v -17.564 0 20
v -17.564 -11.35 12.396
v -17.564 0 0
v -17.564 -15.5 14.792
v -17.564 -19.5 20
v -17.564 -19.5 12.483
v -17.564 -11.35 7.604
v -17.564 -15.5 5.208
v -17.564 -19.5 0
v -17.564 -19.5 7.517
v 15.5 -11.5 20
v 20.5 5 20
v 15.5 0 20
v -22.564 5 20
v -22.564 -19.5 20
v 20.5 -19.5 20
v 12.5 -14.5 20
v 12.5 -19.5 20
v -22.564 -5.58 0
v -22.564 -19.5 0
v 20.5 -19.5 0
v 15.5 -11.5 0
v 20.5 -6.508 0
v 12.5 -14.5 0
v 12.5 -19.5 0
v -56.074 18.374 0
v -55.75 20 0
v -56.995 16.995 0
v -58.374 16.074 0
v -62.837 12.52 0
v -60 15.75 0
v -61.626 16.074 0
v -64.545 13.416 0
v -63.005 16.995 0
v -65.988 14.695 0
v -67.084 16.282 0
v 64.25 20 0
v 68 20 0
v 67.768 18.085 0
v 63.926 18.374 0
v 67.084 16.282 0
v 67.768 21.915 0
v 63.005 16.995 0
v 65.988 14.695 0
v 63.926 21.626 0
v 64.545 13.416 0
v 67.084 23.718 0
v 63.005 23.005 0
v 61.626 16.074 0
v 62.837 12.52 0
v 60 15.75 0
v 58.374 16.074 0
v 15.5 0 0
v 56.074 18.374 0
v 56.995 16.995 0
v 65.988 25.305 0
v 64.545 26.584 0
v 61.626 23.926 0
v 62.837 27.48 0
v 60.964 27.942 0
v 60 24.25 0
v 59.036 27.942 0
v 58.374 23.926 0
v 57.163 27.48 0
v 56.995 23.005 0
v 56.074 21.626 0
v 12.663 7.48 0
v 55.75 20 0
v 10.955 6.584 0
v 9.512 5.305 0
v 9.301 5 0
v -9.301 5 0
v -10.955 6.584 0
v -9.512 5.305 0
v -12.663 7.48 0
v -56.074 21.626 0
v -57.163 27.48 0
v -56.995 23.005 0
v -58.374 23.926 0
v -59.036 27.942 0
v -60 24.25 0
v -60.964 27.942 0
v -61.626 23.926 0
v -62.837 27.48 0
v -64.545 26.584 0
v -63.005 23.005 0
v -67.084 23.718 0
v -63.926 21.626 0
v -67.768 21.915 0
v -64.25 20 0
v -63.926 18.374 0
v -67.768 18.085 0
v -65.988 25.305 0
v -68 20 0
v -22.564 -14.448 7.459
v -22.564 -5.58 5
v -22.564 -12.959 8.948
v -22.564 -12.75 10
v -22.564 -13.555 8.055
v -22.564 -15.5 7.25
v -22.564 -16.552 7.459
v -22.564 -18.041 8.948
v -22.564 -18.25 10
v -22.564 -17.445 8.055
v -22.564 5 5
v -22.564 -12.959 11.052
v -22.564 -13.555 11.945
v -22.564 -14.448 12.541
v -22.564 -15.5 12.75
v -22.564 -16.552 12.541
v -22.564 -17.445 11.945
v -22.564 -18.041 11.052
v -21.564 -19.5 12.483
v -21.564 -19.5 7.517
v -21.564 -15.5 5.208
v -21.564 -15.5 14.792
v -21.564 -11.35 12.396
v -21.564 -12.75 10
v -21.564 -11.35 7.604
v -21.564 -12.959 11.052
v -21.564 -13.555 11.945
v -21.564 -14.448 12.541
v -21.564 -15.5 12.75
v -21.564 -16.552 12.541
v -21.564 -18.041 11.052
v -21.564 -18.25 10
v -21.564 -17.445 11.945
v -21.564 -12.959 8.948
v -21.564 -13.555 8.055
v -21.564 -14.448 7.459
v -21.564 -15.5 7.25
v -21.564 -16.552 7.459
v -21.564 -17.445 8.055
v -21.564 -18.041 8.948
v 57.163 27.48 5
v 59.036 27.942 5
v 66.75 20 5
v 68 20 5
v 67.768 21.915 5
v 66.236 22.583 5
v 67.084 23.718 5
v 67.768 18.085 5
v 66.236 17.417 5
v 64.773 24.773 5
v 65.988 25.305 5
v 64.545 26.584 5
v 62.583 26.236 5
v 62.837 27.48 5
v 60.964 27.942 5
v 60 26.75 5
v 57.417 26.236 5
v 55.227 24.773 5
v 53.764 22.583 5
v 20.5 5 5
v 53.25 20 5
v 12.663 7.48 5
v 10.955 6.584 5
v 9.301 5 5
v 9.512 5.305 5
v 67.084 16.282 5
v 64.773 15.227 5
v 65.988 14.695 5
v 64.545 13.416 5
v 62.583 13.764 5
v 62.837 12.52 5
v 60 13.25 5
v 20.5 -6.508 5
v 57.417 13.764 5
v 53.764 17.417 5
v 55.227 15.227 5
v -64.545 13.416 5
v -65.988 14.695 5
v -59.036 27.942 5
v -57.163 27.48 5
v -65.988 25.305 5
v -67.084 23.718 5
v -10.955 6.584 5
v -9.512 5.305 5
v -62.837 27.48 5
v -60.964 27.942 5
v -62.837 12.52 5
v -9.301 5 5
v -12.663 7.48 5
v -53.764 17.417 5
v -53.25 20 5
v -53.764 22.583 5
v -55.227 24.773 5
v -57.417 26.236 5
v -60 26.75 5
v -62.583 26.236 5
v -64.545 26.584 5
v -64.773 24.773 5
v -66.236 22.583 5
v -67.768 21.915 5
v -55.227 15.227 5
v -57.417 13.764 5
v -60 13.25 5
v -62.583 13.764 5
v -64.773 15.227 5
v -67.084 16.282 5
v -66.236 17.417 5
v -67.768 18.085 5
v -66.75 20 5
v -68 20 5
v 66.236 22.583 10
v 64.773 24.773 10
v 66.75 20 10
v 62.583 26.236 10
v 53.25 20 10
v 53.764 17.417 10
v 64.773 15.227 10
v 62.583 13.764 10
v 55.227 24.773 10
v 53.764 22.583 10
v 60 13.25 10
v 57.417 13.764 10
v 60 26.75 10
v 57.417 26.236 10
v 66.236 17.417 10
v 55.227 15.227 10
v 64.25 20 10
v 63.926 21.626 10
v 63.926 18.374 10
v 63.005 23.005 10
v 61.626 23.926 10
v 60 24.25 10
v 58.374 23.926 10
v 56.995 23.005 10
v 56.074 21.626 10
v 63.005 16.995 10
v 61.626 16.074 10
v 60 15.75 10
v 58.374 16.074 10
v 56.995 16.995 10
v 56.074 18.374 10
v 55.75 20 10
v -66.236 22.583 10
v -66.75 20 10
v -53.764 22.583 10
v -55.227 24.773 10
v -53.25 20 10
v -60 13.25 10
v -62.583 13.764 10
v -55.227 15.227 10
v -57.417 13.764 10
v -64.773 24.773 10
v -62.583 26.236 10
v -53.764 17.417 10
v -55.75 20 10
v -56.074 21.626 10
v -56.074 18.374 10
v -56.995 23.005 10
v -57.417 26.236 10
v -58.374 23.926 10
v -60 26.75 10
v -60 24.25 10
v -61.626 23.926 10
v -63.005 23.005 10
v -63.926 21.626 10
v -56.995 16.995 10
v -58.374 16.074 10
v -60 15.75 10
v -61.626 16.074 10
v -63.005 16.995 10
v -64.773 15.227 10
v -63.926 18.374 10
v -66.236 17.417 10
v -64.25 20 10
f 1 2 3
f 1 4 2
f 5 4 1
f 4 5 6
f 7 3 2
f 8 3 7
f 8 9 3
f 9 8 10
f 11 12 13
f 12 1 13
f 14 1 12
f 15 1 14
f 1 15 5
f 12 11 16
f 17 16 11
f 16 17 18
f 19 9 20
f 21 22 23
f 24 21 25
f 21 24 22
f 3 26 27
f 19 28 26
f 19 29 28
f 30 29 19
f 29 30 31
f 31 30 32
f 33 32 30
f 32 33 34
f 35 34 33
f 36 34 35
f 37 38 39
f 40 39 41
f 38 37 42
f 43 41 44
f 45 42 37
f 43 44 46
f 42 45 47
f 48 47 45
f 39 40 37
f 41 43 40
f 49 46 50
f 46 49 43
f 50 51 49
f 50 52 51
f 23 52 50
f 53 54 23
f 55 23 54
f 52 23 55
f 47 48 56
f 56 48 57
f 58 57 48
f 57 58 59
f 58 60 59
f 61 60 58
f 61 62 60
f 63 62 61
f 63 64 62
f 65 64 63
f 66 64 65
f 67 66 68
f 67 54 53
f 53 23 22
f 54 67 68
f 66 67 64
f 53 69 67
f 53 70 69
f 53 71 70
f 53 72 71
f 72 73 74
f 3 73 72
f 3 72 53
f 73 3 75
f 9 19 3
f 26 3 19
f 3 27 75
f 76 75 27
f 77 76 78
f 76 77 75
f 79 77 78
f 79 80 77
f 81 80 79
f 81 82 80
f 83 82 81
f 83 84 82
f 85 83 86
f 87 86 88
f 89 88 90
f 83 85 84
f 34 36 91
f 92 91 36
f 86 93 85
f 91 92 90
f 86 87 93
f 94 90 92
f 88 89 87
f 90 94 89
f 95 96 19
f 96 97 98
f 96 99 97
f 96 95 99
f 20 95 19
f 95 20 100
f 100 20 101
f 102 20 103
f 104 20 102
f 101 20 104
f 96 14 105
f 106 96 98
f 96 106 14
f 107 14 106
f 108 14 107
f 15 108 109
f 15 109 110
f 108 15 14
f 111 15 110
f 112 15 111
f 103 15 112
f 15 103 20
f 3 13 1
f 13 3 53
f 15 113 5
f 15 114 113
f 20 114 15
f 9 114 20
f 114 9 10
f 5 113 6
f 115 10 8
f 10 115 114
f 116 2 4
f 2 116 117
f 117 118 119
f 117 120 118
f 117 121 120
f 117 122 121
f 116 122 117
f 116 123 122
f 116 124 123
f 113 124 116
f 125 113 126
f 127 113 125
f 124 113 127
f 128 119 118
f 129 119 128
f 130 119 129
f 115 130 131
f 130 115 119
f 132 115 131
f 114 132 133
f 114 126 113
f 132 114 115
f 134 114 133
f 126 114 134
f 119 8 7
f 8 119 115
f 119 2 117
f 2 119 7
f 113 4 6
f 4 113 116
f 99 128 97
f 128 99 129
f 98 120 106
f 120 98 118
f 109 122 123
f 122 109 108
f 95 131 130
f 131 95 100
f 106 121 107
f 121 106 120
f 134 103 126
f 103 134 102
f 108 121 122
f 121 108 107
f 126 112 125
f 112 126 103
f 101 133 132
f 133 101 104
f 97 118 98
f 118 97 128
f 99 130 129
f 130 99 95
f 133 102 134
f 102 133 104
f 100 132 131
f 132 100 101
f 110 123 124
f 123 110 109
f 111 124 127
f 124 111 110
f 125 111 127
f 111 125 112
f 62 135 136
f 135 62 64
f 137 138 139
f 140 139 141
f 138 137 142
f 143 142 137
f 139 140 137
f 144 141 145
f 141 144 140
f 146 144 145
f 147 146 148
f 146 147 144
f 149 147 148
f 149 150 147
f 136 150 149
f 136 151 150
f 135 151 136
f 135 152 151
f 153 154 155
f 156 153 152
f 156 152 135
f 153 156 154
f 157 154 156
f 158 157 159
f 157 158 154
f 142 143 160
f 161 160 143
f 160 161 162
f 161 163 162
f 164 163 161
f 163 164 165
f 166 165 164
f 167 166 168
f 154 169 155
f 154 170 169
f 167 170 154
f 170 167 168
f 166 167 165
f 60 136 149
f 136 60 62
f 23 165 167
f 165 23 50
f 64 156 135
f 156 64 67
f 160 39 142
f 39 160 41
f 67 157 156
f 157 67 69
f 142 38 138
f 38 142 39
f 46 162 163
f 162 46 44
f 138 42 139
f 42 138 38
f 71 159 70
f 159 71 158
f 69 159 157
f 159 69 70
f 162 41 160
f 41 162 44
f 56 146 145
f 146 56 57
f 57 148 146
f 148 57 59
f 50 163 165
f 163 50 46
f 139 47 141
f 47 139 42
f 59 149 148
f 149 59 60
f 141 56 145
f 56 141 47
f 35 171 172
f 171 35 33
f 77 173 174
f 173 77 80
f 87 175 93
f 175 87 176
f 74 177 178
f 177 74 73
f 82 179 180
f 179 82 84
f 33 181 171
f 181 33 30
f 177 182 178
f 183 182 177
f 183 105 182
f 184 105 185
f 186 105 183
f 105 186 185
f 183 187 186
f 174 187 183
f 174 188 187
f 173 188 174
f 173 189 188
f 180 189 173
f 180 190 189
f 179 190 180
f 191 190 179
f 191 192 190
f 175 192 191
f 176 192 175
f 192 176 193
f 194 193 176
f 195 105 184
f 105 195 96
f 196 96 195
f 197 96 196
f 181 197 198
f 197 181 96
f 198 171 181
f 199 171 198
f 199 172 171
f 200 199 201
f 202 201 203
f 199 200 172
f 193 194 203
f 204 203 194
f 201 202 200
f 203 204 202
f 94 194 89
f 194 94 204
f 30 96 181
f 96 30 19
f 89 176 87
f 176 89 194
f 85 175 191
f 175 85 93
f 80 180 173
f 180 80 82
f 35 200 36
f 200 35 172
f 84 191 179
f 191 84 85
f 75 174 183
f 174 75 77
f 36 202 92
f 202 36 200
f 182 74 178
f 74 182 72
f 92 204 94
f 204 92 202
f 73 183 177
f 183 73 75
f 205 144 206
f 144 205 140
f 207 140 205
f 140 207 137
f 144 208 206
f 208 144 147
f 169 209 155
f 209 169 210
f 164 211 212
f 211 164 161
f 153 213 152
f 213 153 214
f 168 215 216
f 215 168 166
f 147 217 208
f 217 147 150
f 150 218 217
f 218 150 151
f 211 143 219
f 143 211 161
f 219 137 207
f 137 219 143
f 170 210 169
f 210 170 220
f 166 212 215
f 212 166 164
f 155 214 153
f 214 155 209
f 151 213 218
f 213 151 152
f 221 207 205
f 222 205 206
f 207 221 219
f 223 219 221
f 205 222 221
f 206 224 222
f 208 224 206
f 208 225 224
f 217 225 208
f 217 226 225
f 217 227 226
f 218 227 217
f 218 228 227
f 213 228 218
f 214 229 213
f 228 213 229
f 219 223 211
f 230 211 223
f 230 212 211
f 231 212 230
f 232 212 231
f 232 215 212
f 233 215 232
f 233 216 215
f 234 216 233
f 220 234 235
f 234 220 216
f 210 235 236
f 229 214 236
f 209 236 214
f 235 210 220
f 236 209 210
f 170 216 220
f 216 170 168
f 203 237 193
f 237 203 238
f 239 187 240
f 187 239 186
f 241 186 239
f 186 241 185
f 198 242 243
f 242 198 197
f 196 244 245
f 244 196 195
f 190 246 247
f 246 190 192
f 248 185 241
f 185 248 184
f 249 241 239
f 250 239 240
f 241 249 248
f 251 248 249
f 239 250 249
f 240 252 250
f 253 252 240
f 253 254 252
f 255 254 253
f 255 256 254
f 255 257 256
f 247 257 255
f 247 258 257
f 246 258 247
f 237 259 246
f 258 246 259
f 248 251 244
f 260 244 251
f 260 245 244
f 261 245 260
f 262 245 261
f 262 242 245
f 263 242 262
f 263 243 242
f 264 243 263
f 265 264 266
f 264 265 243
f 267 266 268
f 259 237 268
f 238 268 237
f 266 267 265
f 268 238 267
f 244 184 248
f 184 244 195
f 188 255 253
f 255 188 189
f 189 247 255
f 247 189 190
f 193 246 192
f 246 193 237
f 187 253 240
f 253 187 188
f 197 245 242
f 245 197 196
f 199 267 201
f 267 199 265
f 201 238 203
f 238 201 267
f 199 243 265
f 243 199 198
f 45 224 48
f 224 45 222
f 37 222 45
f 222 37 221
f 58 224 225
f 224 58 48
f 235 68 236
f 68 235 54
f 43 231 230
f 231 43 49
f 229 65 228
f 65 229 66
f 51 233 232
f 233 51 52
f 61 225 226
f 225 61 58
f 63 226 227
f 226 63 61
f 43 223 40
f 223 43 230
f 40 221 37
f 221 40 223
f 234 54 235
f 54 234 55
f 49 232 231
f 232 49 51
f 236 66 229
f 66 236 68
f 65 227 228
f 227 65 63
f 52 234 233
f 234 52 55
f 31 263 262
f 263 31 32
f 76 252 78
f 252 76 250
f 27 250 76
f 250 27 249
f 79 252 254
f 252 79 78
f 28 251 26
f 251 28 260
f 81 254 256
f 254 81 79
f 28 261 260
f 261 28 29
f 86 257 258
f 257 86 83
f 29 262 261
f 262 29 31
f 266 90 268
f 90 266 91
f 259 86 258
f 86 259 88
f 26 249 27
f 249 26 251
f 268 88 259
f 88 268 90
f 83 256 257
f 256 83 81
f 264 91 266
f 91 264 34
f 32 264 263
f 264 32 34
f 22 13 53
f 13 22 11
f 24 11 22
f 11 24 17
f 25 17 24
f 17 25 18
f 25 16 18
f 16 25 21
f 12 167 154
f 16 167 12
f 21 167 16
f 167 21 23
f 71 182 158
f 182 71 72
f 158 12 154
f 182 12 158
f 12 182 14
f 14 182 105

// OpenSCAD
// file: spool_rondelle.scad
// eLKa1
// spool_rondelle
// GNU GPL v3
// lkiefer <blog.lkiefer.org> and contributors
// http://www.reprap.org/wiki/ELKa
// https://github.com/kimented/elka1

module spool_rondelle() {
  $fn=128;
  disque=45;
  droulement=22.3;
  dext=30;
  eroulement=9;
  ep=1.5;
  
  echo ("spool_rondelle");

  difference(){
    union(){
      cylinder(h=ep,d=disque);
      cylinder(h=eroulement+ep, d=dext);
    }
    translate([0,0,-1]) cylinder(h=eroulement+1, d=droulement);
    cylinder(h=eroulement+ep+1, d=droulement-2);
  }
}

spool_rondelle();
// file: config.scad
// Paramètres de la machine

decal=-30;            // décallage du chassis xz
hauteur=400;          // hauteur totale chassis
largeur=400;          // largeur totale chassis
longueur=470;         // longueur totale chassis
hauteur_base=90;      // hauteur de la base
entraxe_y=140;        // distance entre les tiges Ø8 axe Y
entraxe_x=45;         // distance entre les tiges Ø8 axe X

couleur=[1,0.6,0];



// Paramètre des pièces et jeux

// écart plateau/courroie
// y_belt_holder
belt_h=13;      // écart entre la courroie et le plateau

// écart plateau/tiges lisses
// y_lm8uu
decal_plateau=12; // Décallage en Y

// décallage des tiges lisses Y
// support_tige8_y
decal_tiges=5;

// décallage moteur Y
// y_motor
decal_motory_z=11;
decal_motory_y=25;

// Equerres de fixation position fermée
eq_ec=10;      // écart entre profilés

// Fixations axe Z
pos_z=26;      // position des axes par rapport au profilé (>= 21)
hauteur_z=20;  // hauteur des fixations
entraxe_z=17;  // distance entre les tiges Ø8 et M5
// est ce que la tige de 8 dépasse du profilé de 30?
// si oui, on décale les fixations
decalx=max(-42/2+entraxe_z+8/2+2, 0);

// Roulements linéaires
lbd = 15; // diamètre ext
lbh = 24; // hauteur

// x_carriage
he_x=23;  // entraxe hotend x
he_y=23;  // entraxe hotend y
sen_x=13; // entraxe capteur x
sen_y=23; // entraxe capteur y

// Plats écrous
ec3=5.7;
ec4=7.2;
ec5=8.2;
ec6=10.2;

// Jeu sur plats pour les écrous glissants
jec=0.2;

// hauteur écrous
ec3h=2.4;
ec4h=3.2;
ec5h=4.7;
ec6h=5.2;

// Vis
vis3=3.5;
vis4=4.5;
vis5=5.5;
vis6=6.5;

// nombre de dents des poulies
poulie=20;

// Pas des courroies
pas=2;

// diamètre des poulies
dpoulie=poulie*pas/3.1416;
// main file
// eLKa1
// spool_holder
// GNU GPL v3
// lkiefer <blog.lkiefer.org> and contributors
// http://www.reprap.org/wiki/ELKa
// https://github.com/kimented/elka1

include <config.scad>;
use <spool_rondelle.scad>;

module spool_holder(assemblage,sym) {
  
  pro=31;   // profilé
  ra=8;     // largeur rainure
  ra2=3;    // profondeur rainure
  lar=20;   // largeur
  ep=5;     // épaisseur
  pla=8.3;  // plats écrou
  pla2=4;   // épaisseur écrou
  vis=5.5;  // vis de serrage
  rou1=16;  // extérieur roulement
  rou2=8.5; // intérieur roulement
  x=60;     // position roulement
  y=20;     // position roulement
  e=5;      // écart du roulement

  if (sym==1){
    echo ("spool_holder (symétrie)");
  }
  else{
    echo ("spool_holder");
  }
  
  jeu=sqrt(pro*pro+((pro-ra)/2)*((pro-ra)/2))-pro;
  
  color( couleur ) {
    // patte avant
    linear_extrude(lar) polygon([[pro/2,0],[pro/2,-pro/2+ra/2],[pro/2-ra2,-pro/2+ra/2-ra2],[pro/2-ra2,-pro/2-ra/2],[pro/2+ep,-pro/2-ra/2],[pro/2+ep,0]]);

    // arrière
    difference(){
      translate([-ep-pro/2-jeu,-(pro+ra)/2,0]) cube([ep,(pro+ra)/2,lar]);
      translate([-pro/2-jeu-pla2,-pro/2,lar/2]) rotate([0,90,0]) cylinder(d=pla*2/sqrt(3), h=pla2+1, $fn=6);
      translate([-pro/2-jeu-ep-1,-pro/2,lar/2]) rotate([0,90,0]) cylinder(d=vis, h=ep+2, $fn=16);
    }
    // dessus
    translate([-jeu-pro/2-ep,0,0]) cube([2*ep+jeu+pro,ep,lar]);

    difference(){
      union(){
        // Bras droit
        hull(){
          translate([pro/2,0,0]) cylinder(d=rou1, h=ep);
          translate([x,y,0]) cylinder(d=rou1, h=ep);
        }
        // Bras gauche
        hull(){
          translate([-pro/2,0,0]) cylinder(d=rou1, h=ep);
          translate([-x,y,0]) cylinder(d=rou1, h=ep);
        }
        // entretoise pour roulement
        translate([x,y,0]) cylinder(d=rou2+5, h=ep+e, $fn=16);
        translate([-x,y,0]) cylinder(d=rou2+5, h=ep+e, $fn=16);
      }
      translate([-pro/2-jeu,-pro,-1]) cube([pro+2*jeu,pro,lar+2]);
      // trous pour roulements
      translate([x,y,-1]) cylinder(d=rou2, h=ep+e+2, $fn=16);
      translate([-x,y,-1]) cylinder(d=rou2, h=ep+e+2, $fn=16);
    }
    if (assemblage==1){
      translate([x,y,ep+e-2]) spool_rondelle();
      translate([-x,y,ep+e-2]) spool_rondelle();
      //color( "DeepSkyBlue" ) {translate([0,94,15]) cylinder(h=50, d=160, $fn=64);}
      
    }
  }

}

module spool_holder_sym(assemblage) {
  mirror([0,0,1]) spool_holder(assemblage,1);
}

spool_holder();


//translate([x,y,10]) cylinder(h=1, d=30);
